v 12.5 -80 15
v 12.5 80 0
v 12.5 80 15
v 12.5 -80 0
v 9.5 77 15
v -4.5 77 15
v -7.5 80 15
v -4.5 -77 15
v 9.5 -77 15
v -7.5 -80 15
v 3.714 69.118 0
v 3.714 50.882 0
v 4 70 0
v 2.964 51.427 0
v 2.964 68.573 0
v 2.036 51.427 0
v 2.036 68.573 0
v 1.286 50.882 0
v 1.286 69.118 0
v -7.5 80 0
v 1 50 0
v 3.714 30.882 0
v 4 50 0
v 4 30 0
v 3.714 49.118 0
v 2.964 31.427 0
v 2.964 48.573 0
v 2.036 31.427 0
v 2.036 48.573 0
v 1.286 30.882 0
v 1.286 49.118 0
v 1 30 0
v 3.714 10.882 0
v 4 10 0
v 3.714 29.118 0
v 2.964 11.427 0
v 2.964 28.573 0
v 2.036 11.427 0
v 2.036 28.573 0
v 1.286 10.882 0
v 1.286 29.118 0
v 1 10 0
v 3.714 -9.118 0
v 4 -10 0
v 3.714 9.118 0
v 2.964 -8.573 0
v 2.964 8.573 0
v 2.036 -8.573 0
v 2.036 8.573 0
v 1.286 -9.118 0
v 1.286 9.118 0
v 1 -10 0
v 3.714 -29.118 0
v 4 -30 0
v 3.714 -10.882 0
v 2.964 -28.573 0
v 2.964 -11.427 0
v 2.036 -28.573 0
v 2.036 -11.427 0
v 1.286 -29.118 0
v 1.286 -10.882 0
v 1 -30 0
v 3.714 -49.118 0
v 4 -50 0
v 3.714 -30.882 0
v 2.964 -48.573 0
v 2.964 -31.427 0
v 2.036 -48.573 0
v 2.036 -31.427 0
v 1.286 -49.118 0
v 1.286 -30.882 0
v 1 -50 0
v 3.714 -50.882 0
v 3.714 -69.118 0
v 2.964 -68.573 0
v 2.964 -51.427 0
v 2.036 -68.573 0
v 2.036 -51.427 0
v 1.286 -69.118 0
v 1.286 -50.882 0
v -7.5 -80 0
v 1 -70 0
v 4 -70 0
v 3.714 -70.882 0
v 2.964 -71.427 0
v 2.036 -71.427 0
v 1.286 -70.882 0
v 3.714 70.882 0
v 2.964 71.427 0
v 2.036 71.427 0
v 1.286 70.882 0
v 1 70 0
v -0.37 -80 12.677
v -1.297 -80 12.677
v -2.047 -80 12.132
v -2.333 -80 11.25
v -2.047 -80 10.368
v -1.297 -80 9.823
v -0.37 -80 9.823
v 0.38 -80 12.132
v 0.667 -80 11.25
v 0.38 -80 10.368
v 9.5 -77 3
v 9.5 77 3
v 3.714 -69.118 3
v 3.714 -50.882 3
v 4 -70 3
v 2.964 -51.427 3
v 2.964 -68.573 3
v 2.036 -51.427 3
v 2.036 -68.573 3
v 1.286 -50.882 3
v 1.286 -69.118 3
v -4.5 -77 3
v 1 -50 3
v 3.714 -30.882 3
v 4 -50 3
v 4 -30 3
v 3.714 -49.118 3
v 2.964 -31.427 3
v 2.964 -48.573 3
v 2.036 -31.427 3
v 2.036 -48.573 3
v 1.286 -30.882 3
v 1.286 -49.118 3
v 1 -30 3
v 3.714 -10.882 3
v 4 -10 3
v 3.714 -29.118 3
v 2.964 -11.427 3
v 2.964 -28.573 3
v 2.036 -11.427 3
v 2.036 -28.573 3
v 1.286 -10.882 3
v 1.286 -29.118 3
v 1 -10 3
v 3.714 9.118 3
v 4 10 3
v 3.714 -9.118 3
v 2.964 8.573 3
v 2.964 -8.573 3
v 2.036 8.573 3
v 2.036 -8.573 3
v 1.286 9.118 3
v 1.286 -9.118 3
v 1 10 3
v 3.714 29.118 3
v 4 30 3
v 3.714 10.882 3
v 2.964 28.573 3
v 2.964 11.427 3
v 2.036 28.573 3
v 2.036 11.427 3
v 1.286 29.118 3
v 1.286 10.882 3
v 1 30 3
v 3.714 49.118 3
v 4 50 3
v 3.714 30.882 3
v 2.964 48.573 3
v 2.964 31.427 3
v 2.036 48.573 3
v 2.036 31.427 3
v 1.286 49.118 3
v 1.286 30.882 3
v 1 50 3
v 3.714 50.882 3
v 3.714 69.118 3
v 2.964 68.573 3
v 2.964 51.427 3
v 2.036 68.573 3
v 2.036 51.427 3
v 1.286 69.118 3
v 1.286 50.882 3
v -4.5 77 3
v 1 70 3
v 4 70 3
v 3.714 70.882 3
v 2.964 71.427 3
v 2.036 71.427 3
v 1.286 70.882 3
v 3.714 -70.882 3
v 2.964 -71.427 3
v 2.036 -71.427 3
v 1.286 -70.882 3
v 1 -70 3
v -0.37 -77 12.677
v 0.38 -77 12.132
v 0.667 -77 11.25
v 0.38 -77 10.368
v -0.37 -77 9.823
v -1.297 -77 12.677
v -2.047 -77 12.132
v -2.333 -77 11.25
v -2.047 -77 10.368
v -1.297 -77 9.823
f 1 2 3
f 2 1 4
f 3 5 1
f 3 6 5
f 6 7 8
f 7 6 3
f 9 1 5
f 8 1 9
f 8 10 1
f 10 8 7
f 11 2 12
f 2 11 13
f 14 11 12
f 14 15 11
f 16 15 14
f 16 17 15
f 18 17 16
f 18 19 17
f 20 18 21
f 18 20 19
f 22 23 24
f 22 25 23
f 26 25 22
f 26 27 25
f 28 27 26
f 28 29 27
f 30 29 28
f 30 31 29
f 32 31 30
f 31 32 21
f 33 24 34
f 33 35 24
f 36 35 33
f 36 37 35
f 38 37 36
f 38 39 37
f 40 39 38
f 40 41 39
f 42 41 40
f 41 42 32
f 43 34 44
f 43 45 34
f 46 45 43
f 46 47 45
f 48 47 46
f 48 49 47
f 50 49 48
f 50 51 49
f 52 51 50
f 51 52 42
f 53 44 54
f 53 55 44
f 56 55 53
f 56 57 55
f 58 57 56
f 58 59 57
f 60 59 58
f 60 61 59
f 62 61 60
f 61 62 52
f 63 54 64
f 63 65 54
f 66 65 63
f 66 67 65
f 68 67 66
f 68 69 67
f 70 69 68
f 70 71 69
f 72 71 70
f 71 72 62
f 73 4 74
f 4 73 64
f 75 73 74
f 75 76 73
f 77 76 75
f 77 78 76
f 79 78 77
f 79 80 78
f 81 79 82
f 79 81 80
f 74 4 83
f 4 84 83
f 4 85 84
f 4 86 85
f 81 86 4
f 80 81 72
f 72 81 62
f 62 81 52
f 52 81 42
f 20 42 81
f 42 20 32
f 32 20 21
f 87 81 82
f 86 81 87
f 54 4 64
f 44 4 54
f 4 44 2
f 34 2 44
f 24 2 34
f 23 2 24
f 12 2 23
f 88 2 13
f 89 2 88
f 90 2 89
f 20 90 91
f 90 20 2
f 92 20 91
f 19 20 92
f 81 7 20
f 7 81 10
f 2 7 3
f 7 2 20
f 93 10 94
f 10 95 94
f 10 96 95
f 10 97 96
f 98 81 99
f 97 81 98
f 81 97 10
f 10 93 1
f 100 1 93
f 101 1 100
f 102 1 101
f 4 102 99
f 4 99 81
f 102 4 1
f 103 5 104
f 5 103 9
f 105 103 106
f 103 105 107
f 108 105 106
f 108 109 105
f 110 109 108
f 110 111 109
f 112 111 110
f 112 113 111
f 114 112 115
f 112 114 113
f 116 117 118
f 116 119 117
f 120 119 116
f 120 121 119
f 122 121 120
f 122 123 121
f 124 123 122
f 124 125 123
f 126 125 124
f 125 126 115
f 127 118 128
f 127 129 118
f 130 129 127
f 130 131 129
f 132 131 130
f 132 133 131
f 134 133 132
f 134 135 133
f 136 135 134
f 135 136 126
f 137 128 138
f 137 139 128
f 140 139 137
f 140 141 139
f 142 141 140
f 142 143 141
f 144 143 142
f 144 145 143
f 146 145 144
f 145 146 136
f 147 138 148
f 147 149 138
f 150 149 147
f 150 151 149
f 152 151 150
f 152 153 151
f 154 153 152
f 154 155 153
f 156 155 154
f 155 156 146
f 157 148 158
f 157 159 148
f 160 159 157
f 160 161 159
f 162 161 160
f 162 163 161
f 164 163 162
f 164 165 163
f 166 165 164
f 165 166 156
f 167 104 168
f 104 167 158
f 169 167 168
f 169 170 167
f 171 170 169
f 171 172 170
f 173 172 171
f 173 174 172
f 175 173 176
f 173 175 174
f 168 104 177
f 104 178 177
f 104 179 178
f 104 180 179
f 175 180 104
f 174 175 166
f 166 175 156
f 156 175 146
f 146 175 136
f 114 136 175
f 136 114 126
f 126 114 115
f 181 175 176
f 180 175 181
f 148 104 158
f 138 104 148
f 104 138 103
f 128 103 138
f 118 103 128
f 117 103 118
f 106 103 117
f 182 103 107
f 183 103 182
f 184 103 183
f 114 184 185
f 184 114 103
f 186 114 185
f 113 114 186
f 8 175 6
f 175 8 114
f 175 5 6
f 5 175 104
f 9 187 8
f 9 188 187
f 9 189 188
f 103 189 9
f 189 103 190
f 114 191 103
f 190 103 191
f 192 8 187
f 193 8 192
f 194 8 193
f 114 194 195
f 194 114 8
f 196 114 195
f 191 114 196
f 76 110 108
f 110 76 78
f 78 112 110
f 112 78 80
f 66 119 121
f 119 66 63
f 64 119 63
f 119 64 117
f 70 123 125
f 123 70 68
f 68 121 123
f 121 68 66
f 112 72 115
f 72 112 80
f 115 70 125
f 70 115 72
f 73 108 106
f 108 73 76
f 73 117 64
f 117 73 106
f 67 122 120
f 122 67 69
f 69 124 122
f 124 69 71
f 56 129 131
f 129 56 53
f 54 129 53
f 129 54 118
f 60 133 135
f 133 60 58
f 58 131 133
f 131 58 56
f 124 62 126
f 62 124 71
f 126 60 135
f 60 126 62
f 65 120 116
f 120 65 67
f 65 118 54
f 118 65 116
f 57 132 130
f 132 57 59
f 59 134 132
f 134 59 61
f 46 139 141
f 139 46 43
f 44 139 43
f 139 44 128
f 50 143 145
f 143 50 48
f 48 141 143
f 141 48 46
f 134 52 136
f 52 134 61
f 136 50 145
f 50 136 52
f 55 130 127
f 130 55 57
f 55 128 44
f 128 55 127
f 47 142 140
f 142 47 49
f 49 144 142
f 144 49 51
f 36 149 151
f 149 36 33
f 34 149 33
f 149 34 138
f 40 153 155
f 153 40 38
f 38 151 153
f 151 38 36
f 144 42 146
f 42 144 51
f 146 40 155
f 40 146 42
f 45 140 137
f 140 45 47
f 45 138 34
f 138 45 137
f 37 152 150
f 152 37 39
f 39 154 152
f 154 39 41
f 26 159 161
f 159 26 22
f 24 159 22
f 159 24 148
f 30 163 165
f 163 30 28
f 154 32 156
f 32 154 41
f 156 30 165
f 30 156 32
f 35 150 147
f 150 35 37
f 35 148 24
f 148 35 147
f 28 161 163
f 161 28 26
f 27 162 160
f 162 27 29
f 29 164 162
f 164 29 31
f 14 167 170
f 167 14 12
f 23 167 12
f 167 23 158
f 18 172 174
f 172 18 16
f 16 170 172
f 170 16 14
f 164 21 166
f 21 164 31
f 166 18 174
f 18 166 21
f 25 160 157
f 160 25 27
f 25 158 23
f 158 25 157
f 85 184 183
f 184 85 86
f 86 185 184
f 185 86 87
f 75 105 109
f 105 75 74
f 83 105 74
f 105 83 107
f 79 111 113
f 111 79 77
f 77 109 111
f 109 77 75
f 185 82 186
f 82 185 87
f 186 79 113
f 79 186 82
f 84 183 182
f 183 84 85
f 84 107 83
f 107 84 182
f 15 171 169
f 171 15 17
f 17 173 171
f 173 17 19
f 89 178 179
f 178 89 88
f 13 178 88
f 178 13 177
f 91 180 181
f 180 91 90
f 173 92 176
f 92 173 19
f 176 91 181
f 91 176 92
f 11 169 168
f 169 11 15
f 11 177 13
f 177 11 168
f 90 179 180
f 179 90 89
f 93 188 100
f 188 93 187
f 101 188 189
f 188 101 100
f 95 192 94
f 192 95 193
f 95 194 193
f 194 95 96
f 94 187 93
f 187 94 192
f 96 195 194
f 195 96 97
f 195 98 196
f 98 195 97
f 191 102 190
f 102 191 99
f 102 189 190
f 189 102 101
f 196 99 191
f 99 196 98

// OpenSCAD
$fs= 1;

ledCount = 6;
ledSpacing = 20;
endSpacing = 10;
fullHeight = 15;
ledDiameter = 3;
screwDiameter= 3;
wallThickness = 3;
wireHoleDiameter = 3;

fullWidth = 20;
fullLength = 
    (ledCount+1) * ledSpacing
    + endSpacing * 2;
   
translate ([-fullHeight/2,-(fullLength/2),0]) {
    difference() {
        shell();
        leds();
        screws();
        wireHole();
    }
}

module shell() {
    color("blue") {
        difference() {
            cube ([fullWidth,fullLength,fullHeight]);
            translate([
                wallThickness,
                wallThickness,
                wallThickness
            ]) {
                difference() {
                    cube([
                        fullWidth - wallThickness*2,
                        fullLength - wallThickness*2,
                        fullHeight
                    ]);
                }
            }
        }
    }
}

module leds() {
    color("white") {
        for (i = [0:ledCount-1]) {
            translate([
                fullWidth/2,
                endSpacing + (i+1)*ledSpacing,
                -5]
            ) {
                cylinder(
                    h=fullHeight+10, 
                    r=ledDiameter/2);
            }
        }
    }
}

module screws() {
    color("red") {
        translate([
            fullWidth/2,
            endSpacing,
            -5
        ]) {
            cylinder(
                h = fullHeight + 10,
                r = screwDiameter/2);
        }
        
        translate([
            fullWidth/2,
            endSpacing + (ledCount + 1)*ledSpacing,
            -5
        ]) {
            cylinder(
                h = fullHeight + 10,
                r = screwDiameter/2);
        }
    }
}

module wireHole() {
    translate([
        fullWidth / 3,
        wallThickness * 1.25,
        fullHeight * 0.75
    ]) {
        rotate([90,0,0]) {
            color("green") {
                cylinder(
                    h = wallThickness * 1.5,
                    r = wireHoleDiameter / 2
                );
            }
        }
    }
}
